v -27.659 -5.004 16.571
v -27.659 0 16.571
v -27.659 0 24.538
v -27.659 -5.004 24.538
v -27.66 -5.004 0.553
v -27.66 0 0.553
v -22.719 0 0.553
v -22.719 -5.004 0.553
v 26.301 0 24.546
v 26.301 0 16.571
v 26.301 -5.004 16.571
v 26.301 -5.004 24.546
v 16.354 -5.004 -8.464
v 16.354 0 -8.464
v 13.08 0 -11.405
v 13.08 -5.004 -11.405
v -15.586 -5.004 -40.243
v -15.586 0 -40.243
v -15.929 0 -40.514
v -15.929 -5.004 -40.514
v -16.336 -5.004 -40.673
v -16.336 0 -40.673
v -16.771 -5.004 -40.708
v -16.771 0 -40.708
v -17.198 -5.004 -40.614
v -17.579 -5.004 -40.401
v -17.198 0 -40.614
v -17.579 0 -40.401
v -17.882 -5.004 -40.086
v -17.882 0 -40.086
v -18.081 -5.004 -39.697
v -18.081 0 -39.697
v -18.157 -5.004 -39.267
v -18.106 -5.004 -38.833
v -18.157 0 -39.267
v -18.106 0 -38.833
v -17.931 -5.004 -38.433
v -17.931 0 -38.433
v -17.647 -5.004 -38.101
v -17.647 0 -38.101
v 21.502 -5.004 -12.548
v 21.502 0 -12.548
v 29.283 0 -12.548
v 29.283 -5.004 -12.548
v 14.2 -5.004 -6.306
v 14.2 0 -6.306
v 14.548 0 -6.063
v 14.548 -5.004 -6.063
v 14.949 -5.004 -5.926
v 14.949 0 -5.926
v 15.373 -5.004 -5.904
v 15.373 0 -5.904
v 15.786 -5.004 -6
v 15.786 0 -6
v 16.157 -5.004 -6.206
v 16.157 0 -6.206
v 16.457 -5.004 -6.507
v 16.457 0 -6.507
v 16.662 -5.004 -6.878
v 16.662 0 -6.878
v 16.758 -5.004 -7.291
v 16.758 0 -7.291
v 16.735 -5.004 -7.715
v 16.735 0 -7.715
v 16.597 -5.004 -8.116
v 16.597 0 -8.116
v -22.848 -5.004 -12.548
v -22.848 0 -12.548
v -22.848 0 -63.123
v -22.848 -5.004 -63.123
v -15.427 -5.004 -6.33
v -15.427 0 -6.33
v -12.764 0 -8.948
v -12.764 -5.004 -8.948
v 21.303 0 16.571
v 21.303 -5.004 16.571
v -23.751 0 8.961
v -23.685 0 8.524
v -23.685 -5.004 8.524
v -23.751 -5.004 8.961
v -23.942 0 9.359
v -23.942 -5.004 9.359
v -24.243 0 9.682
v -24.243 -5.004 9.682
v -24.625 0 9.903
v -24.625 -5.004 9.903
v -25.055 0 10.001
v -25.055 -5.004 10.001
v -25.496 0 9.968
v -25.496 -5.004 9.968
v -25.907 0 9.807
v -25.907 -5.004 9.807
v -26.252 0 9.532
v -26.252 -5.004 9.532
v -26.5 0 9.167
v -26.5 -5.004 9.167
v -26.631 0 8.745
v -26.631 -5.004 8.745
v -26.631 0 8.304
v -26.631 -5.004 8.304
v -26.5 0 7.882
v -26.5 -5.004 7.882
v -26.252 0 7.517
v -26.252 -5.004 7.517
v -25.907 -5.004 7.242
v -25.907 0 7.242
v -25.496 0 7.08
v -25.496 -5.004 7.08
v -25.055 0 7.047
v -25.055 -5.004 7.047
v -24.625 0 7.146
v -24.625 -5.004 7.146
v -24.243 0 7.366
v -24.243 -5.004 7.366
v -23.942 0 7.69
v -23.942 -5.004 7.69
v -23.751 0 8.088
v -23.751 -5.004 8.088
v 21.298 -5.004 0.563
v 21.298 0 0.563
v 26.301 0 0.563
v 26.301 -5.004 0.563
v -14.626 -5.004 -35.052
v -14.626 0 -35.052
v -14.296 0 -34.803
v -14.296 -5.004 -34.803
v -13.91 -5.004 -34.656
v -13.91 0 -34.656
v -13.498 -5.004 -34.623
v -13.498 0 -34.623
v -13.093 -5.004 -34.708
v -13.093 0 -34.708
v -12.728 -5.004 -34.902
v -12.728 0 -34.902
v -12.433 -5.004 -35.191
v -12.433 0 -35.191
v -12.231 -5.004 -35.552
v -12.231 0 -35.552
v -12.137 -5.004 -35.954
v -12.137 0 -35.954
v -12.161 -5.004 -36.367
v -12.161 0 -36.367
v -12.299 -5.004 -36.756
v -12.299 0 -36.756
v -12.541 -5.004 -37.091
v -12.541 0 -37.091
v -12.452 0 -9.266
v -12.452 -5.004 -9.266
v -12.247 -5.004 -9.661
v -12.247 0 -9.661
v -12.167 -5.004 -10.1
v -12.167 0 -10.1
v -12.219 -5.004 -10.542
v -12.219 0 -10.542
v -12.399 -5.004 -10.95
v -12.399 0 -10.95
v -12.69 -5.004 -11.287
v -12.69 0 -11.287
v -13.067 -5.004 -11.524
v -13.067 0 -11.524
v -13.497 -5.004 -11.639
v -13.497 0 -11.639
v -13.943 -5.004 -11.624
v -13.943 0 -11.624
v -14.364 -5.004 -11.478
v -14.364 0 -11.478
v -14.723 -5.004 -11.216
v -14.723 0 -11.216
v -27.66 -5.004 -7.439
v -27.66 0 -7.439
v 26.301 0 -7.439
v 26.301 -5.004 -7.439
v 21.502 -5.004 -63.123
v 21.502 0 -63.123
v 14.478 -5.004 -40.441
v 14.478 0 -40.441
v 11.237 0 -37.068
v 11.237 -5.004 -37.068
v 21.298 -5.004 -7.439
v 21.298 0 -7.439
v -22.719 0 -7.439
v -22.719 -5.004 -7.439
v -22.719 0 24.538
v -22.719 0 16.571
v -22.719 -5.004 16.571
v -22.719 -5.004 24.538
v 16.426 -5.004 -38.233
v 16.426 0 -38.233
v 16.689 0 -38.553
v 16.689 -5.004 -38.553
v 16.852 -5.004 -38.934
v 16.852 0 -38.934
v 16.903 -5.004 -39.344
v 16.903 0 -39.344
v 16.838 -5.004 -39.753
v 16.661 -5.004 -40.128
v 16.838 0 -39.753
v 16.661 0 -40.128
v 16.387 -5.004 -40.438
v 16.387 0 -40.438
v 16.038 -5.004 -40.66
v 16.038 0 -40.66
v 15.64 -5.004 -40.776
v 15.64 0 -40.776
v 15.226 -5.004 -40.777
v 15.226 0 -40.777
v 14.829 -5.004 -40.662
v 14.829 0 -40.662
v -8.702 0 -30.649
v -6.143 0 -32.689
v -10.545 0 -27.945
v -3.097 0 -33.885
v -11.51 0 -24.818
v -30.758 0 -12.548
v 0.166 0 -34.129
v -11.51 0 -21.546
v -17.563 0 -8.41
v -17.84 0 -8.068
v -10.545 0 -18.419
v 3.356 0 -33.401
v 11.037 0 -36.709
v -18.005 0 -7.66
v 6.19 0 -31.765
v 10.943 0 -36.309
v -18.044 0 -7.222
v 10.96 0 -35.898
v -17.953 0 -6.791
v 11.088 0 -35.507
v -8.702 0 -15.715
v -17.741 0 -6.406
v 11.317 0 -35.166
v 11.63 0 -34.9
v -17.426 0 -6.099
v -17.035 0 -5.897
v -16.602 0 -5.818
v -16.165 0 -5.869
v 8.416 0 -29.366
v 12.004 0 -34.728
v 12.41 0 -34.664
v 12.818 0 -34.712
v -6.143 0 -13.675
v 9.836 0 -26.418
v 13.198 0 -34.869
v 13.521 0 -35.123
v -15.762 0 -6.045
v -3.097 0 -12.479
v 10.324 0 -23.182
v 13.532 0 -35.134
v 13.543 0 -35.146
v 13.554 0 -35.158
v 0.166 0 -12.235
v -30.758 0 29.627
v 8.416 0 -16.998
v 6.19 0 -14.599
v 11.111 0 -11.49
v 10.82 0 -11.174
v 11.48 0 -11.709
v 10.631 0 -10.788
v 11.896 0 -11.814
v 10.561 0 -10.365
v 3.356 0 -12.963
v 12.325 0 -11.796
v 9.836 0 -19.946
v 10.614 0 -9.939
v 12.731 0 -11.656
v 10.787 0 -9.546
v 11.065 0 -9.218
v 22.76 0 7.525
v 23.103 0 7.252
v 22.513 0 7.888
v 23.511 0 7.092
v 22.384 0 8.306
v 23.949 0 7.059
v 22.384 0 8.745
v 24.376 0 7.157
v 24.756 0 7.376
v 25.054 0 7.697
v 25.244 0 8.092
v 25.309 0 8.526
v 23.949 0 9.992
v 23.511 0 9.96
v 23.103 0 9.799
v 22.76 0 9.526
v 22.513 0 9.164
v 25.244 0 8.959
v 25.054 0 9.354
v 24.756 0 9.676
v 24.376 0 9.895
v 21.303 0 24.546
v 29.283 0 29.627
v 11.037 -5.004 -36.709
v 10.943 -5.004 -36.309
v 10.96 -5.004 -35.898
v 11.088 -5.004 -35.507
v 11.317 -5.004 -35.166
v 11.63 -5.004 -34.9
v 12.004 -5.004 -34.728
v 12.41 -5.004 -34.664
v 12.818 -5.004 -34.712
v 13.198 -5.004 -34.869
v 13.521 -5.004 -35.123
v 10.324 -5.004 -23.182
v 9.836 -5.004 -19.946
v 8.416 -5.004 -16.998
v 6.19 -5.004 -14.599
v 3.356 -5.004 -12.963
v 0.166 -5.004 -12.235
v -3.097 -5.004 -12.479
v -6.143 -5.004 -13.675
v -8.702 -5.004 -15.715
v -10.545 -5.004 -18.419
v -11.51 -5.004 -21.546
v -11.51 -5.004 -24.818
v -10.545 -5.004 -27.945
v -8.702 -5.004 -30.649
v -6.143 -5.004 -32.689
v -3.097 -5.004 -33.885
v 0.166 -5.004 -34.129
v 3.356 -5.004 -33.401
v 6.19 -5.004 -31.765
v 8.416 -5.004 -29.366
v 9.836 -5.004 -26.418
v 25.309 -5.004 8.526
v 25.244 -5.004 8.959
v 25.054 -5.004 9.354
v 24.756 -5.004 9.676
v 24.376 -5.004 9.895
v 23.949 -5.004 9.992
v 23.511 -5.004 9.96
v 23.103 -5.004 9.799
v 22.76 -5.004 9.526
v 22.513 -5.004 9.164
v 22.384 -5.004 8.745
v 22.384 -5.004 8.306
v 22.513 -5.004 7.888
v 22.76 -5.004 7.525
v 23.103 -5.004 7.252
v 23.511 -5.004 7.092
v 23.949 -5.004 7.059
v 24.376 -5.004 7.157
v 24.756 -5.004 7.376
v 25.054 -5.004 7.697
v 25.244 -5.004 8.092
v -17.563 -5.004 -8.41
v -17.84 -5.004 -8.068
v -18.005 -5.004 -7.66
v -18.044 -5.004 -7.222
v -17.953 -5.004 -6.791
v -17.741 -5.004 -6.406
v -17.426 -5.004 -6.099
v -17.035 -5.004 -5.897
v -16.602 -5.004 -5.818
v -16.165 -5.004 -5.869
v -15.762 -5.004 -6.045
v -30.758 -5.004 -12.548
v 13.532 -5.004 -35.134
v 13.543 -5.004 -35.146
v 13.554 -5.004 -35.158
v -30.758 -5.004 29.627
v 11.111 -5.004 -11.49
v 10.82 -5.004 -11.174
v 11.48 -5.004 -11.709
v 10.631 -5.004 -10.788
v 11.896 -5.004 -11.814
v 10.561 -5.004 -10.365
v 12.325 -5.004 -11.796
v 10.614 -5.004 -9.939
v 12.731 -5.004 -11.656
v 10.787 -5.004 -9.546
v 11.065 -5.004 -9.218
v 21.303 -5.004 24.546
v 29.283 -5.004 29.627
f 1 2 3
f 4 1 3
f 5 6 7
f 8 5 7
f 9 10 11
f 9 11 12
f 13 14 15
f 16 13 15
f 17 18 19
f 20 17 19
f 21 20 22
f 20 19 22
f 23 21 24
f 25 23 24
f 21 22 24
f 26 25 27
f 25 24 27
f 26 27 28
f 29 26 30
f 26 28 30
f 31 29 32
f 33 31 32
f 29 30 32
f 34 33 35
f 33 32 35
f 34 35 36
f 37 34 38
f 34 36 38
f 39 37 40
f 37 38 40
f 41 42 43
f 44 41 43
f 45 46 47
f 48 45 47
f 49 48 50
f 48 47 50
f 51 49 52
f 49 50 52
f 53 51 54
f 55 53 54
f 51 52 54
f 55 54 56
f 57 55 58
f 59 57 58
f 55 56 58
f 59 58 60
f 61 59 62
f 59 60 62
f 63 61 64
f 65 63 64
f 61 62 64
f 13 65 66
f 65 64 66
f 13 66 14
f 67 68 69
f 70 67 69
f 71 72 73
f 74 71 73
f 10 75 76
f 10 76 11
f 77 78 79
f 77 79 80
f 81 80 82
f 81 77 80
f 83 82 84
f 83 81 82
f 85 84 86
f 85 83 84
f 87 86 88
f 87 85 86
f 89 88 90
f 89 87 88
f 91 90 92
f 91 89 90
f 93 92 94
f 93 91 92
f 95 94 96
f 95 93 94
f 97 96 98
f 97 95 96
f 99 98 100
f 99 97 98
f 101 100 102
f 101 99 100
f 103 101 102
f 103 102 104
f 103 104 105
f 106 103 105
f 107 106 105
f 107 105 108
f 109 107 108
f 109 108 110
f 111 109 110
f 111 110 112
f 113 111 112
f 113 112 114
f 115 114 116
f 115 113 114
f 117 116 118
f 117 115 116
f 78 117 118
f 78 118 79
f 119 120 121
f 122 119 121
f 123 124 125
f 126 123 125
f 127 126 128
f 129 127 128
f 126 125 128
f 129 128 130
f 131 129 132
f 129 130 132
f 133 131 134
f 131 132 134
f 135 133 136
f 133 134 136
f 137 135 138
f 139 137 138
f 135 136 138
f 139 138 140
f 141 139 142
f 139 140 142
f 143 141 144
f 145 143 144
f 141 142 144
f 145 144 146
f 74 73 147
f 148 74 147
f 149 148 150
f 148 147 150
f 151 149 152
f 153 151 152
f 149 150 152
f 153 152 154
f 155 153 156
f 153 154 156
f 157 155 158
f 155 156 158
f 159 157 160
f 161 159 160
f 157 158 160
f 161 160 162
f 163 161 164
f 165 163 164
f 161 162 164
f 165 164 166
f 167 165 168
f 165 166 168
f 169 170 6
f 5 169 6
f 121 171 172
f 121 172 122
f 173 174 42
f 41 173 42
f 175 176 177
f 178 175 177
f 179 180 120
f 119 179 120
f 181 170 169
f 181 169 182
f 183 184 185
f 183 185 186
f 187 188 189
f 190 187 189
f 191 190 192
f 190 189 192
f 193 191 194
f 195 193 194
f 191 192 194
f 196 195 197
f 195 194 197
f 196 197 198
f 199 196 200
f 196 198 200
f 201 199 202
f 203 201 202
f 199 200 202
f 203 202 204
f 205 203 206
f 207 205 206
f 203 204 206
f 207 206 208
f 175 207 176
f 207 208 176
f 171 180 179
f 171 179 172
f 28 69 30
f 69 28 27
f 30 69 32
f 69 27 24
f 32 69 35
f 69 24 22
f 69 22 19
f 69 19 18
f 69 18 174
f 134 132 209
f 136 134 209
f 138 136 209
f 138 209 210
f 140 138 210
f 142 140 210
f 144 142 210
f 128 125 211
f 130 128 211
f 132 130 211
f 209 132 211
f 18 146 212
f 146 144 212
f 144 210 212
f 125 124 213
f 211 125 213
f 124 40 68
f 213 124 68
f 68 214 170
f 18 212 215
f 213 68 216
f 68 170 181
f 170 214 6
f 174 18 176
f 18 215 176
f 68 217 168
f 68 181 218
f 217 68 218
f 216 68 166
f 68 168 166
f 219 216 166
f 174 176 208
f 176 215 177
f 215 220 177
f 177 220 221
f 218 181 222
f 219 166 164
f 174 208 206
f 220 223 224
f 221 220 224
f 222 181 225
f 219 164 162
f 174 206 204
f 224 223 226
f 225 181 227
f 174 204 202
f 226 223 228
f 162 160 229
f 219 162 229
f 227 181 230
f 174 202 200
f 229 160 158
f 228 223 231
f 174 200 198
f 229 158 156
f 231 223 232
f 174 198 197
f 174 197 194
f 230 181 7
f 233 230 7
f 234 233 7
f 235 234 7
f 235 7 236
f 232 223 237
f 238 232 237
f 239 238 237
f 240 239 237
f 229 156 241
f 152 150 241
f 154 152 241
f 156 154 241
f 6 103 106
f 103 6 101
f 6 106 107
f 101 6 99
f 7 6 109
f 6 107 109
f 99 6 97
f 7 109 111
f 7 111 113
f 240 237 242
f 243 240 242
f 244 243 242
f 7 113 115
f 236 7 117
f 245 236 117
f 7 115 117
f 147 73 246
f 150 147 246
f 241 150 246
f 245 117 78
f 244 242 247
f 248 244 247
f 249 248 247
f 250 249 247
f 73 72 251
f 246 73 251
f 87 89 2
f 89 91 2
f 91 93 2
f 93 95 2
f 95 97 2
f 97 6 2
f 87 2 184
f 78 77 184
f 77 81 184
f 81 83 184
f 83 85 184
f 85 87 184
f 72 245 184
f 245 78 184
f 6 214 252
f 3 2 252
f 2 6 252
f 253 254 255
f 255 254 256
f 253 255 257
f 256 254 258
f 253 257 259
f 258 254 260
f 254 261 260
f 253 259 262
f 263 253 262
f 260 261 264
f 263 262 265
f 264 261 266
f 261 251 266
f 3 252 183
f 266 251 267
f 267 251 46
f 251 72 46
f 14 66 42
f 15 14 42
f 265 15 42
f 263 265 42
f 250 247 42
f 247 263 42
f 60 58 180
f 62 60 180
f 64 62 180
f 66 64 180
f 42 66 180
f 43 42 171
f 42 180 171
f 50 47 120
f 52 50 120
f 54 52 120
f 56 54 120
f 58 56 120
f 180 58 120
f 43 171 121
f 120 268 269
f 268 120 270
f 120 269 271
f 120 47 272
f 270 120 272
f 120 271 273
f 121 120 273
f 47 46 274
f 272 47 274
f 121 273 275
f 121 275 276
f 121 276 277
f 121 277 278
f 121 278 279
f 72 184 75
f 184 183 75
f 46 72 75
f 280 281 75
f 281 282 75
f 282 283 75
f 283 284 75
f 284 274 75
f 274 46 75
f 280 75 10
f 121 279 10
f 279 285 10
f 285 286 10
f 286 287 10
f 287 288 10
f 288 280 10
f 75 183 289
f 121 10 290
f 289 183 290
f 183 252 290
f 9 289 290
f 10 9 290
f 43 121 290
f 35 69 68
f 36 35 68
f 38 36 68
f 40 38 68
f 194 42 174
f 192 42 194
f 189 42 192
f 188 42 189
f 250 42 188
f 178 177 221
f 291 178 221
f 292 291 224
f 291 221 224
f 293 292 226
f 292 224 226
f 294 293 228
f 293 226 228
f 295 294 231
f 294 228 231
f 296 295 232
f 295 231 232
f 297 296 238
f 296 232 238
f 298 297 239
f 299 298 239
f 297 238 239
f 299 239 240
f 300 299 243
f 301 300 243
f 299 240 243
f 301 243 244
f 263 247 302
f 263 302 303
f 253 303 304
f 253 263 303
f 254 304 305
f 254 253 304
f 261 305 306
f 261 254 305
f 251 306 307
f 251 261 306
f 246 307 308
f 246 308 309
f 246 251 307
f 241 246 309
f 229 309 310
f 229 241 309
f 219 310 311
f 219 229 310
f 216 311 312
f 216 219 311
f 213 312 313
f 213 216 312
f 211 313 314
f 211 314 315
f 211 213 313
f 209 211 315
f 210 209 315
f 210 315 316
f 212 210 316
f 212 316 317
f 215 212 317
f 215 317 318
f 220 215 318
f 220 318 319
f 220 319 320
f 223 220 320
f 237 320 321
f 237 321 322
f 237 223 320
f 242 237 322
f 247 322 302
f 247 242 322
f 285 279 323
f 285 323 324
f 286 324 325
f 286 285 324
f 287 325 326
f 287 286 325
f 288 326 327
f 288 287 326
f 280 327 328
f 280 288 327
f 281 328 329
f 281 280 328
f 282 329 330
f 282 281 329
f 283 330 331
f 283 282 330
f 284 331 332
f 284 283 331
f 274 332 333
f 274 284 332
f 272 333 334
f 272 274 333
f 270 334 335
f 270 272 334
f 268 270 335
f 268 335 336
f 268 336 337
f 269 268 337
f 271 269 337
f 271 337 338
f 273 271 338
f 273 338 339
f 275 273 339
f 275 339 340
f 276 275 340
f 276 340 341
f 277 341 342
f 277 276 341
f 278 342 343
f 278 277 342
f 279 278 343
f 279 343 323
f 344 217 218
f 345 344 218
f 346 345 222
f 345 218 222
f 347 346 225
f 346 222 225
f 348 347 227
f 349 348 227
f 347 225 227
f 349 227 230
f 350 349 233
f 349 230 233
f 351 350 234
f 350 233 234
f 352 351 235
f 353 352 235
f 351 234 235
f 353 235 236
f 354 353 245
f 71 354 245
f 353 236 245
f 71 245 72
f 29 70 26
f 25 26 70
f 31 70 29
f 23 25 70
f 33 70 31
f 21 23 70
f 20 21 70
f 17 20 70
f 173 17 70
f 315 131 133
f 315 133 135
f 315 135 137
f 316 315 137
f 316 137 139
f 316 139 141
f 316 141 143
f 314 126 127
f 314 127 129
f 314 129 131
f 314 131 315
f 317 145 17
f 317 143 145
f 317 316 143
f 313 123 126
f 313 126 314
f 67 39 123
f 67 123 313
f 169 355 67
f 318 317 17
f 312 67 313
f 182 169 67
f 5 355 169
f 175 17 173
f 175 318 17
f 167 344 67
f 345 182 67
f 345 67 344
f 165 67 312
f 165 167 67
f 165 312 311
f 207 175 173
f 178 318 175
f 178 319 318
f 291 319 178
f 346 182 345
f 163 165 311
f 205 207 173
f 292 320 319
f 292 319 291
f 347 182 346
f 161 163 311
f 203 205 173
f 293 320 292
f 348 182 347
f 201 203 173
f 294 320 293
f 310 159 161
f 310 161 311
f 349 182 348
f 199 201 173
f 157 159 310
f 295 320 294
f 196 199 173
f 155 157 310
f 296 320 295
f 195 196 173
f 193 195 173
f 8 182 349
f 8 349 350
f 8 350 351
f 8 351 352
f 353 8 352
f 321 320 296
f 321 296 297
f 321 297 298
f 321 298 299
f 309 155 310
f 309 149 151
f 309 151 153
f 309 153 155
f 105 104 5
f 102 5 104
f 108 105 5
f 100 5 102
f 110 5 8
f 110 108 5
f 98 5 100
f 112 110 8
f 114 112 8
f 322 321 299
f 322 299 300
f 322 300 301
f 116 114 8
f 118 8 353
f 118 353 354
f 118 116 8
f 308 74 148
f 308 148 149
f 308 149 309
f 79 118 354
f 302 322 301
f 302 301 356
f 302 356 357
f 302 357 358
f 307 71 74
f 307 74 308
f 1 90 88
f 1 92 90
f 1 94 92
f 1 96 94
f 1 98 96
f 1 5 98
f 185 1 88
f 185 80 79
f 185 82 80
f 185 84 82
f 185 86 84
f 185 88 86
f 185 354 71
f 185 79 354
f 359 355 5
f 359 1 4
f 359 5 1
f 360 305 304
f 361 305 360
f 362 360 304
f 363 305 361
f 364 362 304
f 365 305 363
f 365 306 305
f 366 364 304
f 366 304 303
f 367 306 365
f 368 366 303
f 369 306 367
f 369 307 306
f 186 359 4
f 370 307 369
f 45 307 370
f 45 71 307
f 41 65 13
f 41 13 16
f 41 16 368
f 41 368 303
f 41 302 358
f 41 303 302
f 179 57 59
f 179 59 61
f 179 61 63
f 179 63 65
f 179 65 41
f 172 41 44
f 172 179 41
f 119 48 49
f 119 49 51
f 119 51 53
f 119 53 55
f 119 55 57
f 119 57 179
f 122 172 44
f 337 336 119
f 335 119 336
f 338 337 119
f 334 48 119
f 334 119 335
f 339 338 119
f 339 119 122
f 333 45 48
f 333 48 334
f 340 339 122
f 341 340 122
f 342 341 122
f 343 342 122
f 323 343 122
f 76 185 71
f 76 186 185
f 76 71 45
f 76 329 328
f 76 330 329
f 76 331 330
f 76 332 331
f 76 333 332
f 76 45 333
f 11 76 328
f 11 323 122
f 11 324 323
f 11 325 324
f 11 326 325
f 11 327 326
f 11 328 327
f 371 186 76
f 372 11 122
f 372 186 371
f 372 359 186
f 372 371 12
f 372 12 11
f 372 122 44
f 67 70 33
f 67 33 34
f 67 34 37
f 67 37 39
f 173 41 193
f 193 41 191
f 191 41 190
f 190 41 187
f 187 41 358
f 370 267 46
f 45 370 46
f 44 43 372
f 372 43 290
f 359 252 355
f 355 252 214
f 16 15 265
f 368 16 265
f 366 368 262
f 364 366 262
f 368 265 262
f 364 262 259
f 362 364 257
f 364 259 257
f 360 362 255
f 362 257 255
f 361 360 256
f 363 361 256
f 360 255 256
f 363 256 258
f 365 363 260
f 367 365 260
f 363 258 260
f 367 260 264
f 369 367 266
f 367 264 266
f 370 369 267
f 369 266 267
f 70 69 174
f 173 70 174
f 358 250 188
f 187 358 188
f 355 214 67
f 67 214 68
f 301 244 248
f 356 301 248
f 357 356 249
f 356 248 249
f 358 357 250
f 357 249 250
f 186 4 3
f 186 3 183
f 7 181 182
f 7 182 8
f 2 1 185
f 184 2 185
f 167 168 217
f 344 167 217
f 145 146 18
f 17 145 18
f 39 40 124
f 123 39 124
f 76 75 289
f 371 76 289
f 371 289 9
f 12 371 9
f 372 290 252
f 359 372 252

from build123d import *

# Parameters (mm, degrees)
F0_R     = 10.978044
F0_W     = 4.940685
F0_H     = 7.991237
F0_R_2   = 1.481086
F0_W_2   = 4.940115
F0_H_2   = 7.966079
F0_W_3   = 5.002896
F0_H_3   = 8.001204
F0_R_3   = 1.470755
F0_W_4   = 4.997425
F0_H_4   = 7.974718
F1_DEPTH = 5.0038


with BuildPart() as f1:
    # F0 (on Front) → F1 (new body)
    with BuildSketch(Plane.XZ):
        Polygon((29.282646, 29.627208), (-30.758047, 29.627208), (-30.758047, -12.548319), (-22.847719, -12.548319), (-22.847719, -63.122556), (21.501994, -63.122556), (21.501994, -12.548319), (29.282646, -12.548319), align=None)
        with BuildLine():
            ThreePointArc((-15.586378, -40.243281), (-17.742358, -40.254847), (-17.64737, -38.100929))
            Line((-17.64737, -38.100929), (-14.625554, -35.052073))
            ThreePointArc((-14.625554, -35.052073), (-12.57034, -35.03634), (-12.541453, -37.091411))
            Line((-12.541453, -37.091411), (-15.586378, -40.243281))
        make_face(mode=Mode.SUBTRACT)
        with BuildLine():
            ThreePointArc((16.426139, -38.233279), (16.534977, -40.292482), (14.478289, -40.441467))
            Line((14.478289, -40.441467), (11.236794, -37.068415))
            ThreePointArc((11.236794, -37.068415), (11.464462, -35.022049), (13.520983, -35.12287))
            ThreePointArc((13.520983, -35.12287), (13.537568, -35.140344), (13.55387, -35.158081))
            Line((13.55387, -35.158081), (16.426139, -38.233279))
        make_face(mode=Mode.SUBTRACT)
        with Locations((-0.654383, -23.181881)):
            Circle(F0_R, mode=Mode.SUBTRACT)
        with Locations((-25.189546, -3.442893)):
            Rectangle(F0_W, F0_H, mode=Mode.SUBTRACT)
        with BuildLine():
            ThreePointArc((-17.563489, -8.410167), (-17.594804, -6.240676), (-15.426944, -6.330432))
            Line((-15.426944, -6.330432), (-12.764063, -8.947979))
            ThreePointArc((-12.764063, -8.947979), (-12.531586, -11.12918), (-14.723433, -11.21573))
            Line((-14.723433, -11.21573), (-17.563489, -8.410167))
        make_face(mode=Mode.SUBTRACT)
        with Locations((-25.166028, 8.524365)):
            Circle(F0_R_2, mode=Mode.SUBTRACT)
        with Locations((-25.189262, 20.554467)):
            Rectangle(F0_W_2, F0_H_2, mode=Mode.SUBTRACT)
        with BuildLine():
            ThreePointArc((14.199827, -6.306034), (16.317638, -6.34597), (16.353841, -8.463848))
            Line((16.353841, -8.463848), (13.079717, -11.405483))
            ThreePointArc((13.079717, -11.405483), (10.953875, -11.342186), (11.064754, -9.218293))
            Line((11.064754, -9.218293), (14.199827, -6.306034))
        make_face(mode=Mode.SUBTRACT)
        with Locations((23.799085, -3.43791)):
            Rectangle(F0_W_3, F0_H_3, mode=Mode.SUBTRACT)
        with Locations((23.838598, 8.52569)):
            Circle(F0_R_3, mode=Mode.SUBTRACT)
        with Locations((23.80182, 20.558786)):
            Rectangle(F0_W_4, F0_H_4, mode=Mode.SUBTRACT)
    extrude(amount=F1_DEPTH)


solid = f1.part
